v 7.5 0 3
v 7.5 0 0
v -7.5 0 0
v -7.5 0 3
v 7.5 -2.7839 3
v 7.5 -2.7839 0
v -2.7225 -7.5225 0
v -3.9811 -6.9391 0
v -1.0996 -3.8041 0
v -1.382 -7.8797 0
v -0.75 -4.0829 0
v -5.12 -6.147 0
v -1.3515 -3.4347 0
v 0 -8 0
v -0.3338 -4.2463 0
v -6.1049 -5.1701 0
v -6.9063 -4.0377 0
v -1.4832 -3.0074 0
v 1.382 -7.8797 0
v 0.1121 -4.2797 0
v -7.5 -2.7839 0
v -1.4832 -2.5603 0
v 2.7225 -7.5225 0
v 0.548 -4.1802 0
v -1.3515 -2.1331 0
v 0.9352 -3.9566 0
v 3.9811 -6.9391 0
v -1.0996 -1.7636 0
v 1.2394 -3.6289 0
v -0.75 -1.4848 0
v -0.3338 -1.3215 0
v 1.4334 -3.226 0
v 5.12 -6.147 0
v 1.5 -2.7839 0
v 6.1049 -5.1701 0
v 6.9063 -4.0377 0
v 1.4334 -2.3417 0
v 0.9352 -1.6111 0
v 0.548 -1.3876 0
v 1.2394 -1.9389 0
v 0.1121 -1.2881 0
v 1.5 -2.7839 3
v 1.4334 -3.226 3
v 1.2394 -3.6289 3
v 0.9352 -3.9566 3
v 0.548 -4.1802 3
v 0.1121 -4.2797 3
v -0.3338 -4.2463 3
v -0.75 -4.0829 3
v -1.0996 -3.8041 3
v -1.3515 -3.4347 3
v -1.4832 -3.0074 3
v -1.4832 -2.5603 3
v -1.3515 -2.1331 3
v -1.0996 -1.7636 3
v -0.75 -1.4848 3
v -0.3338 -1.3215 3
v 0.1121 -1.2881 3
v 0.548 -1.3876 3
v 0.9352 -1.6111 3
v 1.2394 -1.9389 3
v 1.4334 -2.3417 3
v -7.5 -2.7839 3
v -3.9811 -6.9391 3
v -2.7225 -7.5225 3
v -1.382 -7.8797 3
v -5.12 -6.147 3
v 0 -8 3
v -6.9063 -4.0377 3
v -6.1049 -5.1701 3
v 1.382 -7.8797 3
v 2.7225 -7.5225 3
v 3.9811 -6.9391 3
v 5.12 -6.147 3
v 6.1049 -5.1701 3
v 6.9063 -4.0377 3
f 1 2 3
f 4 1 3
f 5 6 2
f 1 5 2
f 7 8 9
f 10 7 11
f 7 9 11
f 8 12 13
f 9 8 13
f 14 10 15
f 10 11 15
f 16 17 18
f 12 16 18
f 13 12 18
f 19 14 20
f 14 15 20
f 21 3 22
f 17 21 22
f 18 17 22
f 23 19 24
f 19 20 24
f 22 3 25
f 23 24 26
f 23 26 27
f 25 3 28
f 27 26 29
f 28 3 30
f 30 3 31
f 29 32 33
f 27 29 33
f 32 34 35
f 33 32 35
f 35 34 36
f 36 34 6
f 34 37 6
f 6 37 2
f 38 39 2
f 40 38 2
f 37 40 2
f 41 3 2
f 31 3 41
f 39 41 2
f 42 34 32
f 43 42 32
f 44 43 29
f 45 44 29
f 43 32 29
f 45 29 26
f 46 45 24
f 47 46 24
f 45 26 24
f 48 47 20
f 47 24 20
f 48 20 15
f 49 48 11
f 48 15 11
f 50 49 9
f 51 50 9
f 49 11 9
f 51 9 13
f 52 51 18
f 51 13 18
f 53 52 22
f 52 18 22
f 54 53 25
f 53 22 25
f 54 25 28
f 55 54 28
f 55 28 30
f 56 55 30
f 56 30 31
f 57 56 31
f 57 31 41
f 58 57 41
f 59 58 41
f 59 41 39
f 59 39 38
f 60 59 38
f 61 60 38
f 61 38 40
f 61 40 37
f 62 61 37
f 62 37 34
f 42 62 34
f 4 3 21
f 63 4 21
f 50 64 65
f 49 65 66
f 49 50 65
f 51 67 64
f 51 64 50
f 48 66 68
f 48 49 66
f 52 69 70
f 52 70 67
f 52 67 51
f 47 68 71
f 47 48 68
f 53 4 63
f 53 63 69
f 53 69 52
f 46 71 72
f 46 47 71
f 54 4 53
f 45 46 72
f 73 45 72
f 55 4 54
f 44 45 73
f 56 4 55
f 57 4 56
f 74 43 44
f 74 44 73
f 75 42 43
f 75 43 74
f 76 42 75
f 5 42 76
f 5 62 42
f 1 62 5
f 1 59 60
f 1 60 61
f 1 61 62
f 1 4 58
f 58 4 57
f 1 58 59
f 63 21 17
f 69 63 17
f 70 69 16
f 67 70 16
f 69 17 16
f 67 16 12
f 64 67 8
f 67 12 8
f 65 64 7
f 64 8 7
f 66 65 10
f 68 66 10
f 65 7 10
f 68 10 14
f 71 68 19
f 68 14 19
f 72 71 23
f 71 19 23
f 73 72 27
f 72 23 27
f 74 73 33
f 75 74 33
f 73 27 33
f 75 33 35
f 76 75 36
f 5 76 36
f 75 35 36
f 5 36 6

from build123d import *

# Parameters (mm, degrees)
F1_DEPTH = 3
F2_R     = 1.5
F3_DEPTH = 5


with BuildPart() as f1:
    # F0 (on Top) → F1 (new body)
    with BuildSketch(Plane.XY):
        with BuildLine():
            Line((-7.5, 0), (-7.5, -2.783882))
            ThreePointArc((-7.5, -2.783882), (0, -8), (7.5, -2.783882))
            Line((7.5, -2.783882), (7.5, 0))
            Line((7.5, 0), (-7.5, 0))
        make_face()
    extrude(amount=F1_DEPTH)

    # F2 (on face) → F3 (cut)
    with BuildSketch(Plane(origin=(0, 0, 0), x_dir=(1, 0, 0), z_dir=(0, 0, -1))):
        with Locations((0, 2.783882)):
            Circle(F2_R)
    extrude(amount=-F3_DEPTH, mode=Mode.SUBTRACT)


solid = f1.part
